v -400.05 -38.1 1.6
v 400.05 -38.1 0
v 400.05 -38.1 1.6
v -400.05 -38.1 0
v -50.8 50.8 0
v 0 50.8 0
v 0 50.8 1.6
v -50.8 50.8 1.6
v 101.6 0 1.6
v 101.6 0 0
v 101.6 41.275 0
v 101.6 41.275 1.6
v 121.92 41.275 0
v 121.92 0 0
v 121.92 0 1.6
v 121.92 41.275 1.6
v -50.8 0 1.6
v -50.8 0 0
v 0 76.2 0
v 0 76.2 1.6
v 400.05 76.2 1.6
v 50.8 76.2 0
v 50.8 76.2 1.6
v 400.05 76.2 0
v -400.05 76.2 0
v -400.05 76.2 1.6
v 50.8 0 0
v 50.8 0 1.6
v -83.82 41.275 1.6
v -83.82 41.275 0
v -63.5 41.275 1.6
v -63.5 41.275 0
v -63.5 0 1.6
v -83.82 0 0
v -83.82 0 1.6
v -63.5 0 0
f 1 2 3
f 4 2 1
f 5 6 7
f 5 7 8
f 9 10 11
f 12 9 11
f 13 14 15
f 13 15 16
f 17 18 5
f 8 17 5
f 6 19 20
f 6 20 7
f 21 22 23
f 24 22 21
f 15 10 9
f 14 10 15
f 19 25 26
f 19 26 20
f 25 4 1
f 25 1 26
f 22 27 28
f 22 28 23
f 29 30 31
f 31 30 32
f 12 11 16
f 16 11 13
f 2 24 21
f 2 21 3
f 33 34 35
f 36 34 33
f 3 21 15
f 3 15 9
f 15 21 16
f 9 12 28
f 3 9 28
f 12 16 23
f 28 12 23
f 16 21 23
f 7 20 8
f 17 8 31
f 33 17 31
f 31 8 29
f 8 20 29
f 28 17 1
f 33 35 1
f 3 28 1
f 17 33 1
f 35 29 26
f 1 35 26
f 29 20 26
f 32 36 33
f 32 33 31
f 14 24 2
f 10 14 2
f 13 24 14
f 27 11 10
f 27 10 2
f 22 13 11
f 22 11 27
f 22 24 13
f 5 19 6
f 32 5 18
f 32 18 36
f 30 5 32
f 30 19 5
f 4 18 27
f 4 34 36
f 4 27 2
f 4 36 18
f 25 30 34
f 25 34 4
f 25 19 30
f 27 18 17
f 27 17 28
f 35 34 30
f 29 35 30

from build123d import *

# Parameters (mm, degrees)
BOSS_EXTRUDE1_DEPTH = 1.6002
SKETCH2_W           = 20.32
SKETCH2_H           = 41.275
CUT_EXTRUDE5_DEPTH  = 2.6002
SKETCH3_W           = 50.8
SKETCH3_H           = 50.8
CUT_EXTRUDE6_DEPTH  = 2.54


with BuildPart() as part:
    # Sketch1 → Boss-Extrude1 (new body)
    with BuildSketch(Plane.XY):
        Polygon((0, 0), (50.8, 0), (50.8, 76.2), (400.05, 76.2), (400.05, -38.1), (-400.05, -38.1), (-400.05, 76.2), (0, 76.2), align=None)
    extrude(amount=BOSS_EXTRUDE1_DEPTH)

    # Sketch2 → Cut-Extrude5 (cut, through all)
    with BuildSketch(Plane.XY):
        with Locations((-73.66, 20.6375)):
            Rectangle(SKETCH2_W, SKETCH2_H)
        with Locations((111.76, 20.6375)):
            Rectangle(SKETCH2_W, SKETCH2_H)
    extrude(amount=CUT_EXTRUDE5_DEPTH, mode=Mode.SUBTRACT)

    # Sketch3 → Cut-Extrude6 (cut)
    with BuildSketch(Plane(origin=(0, 0, 0), x_dir=(-1, 0, 0), z_dir=(0, 0, -1))):
        with Locations((25.4, 25.4)):
            Rectangle(SKETCH3_W, SKETCH3_H)
    extrude(amount=-CUT_EXTRUDE6_DEPTH, mode=Mode.SUBTRACT)


solid = part.part
